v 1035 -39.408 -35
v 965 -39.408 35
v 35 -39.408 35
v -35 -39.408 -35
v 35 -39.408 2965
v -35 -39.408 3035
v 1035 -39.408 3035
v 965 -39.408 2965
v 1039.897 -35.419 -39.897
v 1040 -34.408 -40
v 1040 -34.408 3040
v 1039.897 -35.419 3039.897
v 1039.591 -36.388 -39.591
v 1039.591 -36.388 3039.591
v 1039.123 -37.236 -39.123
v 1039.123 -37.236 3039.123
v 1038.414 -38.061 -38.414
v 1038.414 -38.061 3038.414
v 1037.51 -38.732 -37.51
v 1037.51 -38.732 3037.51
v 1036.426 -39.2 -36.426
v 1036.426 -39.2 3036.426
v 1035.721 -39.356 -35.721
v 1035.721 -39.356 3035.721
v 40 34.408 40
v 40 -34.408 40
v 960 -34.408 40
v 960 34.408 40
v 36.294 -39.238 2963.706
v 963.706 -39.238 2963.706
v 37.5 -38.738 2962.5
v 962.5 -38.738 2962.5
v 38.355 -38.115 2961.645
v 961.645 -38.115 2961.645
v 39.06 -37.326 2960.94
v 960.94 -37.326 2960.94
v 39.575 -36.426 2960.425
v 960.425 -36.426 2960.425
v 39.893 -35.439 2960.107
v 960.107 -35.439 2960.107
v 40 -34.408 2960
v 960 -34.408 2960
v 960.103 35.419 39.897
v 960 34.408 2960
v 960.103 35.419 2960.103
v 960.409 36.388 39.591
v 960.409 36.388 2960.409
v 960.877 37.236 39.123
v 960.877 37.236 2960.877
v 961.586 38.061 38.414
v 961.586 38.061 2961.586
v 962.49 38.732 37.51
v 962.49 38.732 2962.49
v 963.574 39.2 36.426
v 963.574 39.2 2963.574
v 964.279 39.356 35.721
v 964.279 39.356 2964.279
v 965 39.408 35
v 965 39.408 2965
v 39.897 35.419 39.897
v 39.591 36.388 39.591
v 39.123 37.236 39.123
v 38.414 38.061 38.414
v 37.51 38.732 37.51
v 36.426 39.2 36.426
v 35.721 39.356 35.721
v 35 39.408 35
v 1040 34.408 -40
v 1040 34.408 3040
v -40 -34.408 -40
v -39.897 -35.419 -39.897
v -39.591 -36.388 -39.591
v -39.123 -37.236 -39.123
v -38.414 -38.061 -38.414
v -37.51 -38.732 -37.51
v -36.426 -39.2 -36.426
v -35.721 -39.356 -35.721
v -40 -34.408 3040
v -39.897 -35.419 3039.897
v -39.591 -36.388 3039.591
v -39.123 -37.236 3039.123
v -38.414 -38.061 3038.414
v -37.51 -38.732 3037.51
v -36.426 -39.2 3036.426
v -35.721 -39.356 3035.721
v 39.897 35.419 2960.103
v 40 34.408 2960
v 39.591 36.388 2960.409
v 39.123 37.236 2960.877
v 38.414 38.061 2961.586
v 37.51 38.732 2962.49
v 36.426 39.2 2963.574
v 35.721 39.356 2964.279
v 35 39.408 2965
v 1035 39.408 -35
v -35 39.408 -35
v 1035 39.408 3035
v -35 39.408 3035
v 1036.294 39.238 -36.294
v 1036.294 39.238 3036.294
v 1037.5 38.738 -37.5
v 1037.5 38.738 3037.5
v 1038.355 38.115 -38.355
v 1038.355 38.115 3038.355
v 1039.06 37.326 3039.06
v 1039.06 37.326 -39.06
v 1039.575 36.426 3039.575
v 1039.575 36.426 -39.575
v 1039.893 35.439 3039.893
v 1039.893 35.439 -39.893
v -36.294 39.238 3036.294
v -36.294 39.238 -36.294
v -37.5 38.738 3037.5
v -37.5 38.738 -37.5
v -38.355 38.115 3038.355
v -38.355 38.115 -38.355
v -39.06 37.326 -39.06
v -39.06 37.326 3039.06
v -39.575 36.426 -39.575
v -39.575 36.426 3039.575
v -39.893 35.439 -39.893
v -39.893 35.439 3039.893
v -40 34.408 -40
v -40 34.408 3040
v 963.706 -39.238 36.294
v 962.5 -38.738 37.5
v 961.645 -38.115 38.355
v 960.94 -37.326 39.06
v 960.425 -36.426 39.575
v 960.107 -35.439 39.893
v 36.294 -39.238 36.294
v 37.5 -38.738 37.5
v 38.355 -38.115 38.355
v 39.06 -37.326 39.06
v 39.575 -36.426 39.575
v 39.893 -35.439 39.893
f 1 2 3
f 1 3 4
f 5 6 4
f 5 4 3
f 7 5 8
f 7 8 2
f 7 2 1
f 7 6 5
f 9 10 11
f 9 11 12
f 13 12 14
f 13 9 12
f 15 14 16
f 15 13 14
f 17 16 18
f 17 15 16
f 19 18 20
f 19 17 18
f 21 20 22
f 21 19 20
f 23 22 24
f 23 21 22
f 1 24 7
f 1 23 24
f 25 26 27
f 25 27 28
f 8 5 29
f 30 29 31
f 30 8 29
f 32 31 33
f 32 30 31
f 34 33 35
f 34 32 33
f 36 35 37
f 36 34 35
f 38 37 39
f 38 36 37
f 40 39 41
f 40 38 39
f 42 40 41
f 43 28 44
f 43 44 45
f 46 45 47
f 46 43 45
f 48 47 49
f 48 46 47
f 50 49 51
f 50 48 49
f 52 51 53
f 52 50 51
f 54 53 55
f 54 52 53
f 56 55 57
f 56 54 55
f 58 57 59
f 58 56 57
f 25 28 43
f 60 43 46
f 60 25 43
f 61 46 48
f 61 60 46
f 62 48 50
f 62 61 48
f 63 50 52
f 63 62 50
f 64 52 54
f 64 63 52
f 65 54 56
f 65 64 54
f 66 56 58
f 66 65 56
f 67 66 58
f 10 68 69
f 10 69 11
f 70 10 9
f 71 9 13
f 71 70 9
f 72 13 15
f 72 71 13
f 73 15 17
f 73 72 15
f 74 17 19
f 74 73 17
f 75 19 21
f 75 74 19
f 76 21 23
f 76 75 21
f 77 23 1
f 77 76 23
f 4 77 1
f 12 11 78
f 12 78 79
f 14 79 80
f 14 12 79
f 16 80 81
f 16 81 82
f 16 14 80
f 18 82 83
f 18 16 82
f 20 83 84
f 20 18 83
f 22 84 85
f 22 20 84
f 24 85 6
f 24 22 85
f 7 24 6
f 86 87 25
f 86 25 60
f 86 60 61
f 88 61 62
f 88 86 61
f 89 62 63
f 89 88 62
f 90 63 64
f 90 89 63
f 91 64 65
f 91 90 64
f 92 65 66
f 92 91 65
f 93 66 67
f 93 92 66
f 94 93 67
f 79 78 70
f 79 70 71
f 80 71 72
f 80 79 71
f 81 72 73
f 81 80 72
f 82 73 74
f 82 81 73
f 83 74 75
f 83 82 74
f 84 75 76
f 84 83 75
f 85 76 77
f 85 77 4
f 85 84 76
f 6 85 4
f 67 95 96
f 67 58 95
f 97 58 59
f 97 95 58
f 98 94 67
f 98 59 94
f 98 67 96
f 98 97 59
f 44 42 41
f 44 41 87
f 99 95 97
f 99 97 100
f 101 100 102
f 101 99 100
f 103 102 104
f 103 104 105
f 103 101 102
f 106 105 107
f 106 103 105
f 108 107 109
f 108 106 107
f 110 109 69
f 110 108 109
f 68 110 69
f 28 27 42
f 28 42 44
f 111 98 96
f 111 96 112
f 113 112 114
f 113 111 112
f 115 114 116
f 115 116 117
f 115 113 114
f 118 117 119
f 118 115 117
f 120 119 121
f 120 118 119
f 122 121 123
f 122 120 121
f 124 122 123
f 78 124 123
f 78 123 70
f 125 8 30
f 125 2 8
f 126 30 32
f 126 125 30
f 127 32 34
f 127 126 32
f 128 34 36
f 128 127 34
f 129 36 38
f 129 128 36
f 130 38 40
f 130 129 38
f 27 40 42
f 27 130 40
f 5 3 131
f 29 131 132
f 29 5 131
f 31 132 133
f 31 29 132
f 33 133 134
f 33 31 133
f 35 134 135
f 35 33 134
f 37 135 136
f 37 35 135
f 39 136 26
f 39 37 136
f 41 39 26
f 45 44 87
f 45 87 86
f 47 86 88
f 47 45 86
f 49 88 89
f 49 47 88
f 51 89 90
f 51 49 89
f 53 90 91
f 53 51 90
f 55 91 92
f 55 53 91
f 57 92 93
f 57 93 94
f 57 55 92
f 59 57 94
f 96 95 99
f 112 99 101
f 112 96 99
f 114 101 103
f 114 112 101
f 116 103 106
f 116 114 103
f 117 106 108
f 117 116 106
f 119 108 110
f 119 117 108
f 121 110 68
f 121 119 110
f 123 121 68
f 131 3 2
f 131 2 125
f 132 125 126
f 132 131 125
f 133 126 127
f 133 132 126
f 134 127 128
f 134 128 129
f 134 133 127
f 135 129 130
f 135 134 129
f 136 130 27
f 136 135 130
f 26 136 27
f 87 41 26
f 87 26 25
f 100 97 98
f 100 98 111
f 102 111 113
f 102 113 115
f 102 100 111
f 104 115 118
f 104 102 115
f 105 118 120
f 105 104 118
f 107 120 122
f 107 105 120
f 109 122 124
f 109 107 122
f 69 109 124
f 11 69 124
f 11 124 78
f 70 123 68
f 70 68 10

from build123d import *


with BuildPart() as f2:
    # F2: sweep along a path in F1
    with BuildLine(Plane.XZ) as f2_path:
        Line((0, 0), (0, 3000))
        Line((0, 3000), (1000, 3000))
        Line((1000, 3000), (1000, 0))
        Line((1000, 0), (0, 0))
    # F0 (on Top) → F2 (sweep)
    with BuildSketch(Plane.XY):
        with BuildLine():
            Line((-35, -39.4079514327), (35, -39.4079514327))
            ThreePointArc((35, -39.4079514327), (38.5355339059, -37.9434853386), (40, -34.4079514327))
            Line((40, -34.4079514327), (40, 34.4079514327))
            ThreePointArc((40, 34.4079514327), (38.5355339059, 37.9434853386), (35, 39.4079514327))
            Line((35, 39.4079514327), (-35, 39.4079514327))
            ThreePointArc((-35, 39.4079514327), (-38.5355339059, 37.9434853386), (-40, 34.4079514327))
            Line((-40, 34.4079514327), (-40, -34.4079514327))
            ThreePointArc((-40, -34.4079514327), (-38.5355339059, -37.9434853386), (-35, -39.4079514327))
        make_face()
    sweep(path=f2_path.line, transition=Transition.RIGHT)


solid = f2.part
